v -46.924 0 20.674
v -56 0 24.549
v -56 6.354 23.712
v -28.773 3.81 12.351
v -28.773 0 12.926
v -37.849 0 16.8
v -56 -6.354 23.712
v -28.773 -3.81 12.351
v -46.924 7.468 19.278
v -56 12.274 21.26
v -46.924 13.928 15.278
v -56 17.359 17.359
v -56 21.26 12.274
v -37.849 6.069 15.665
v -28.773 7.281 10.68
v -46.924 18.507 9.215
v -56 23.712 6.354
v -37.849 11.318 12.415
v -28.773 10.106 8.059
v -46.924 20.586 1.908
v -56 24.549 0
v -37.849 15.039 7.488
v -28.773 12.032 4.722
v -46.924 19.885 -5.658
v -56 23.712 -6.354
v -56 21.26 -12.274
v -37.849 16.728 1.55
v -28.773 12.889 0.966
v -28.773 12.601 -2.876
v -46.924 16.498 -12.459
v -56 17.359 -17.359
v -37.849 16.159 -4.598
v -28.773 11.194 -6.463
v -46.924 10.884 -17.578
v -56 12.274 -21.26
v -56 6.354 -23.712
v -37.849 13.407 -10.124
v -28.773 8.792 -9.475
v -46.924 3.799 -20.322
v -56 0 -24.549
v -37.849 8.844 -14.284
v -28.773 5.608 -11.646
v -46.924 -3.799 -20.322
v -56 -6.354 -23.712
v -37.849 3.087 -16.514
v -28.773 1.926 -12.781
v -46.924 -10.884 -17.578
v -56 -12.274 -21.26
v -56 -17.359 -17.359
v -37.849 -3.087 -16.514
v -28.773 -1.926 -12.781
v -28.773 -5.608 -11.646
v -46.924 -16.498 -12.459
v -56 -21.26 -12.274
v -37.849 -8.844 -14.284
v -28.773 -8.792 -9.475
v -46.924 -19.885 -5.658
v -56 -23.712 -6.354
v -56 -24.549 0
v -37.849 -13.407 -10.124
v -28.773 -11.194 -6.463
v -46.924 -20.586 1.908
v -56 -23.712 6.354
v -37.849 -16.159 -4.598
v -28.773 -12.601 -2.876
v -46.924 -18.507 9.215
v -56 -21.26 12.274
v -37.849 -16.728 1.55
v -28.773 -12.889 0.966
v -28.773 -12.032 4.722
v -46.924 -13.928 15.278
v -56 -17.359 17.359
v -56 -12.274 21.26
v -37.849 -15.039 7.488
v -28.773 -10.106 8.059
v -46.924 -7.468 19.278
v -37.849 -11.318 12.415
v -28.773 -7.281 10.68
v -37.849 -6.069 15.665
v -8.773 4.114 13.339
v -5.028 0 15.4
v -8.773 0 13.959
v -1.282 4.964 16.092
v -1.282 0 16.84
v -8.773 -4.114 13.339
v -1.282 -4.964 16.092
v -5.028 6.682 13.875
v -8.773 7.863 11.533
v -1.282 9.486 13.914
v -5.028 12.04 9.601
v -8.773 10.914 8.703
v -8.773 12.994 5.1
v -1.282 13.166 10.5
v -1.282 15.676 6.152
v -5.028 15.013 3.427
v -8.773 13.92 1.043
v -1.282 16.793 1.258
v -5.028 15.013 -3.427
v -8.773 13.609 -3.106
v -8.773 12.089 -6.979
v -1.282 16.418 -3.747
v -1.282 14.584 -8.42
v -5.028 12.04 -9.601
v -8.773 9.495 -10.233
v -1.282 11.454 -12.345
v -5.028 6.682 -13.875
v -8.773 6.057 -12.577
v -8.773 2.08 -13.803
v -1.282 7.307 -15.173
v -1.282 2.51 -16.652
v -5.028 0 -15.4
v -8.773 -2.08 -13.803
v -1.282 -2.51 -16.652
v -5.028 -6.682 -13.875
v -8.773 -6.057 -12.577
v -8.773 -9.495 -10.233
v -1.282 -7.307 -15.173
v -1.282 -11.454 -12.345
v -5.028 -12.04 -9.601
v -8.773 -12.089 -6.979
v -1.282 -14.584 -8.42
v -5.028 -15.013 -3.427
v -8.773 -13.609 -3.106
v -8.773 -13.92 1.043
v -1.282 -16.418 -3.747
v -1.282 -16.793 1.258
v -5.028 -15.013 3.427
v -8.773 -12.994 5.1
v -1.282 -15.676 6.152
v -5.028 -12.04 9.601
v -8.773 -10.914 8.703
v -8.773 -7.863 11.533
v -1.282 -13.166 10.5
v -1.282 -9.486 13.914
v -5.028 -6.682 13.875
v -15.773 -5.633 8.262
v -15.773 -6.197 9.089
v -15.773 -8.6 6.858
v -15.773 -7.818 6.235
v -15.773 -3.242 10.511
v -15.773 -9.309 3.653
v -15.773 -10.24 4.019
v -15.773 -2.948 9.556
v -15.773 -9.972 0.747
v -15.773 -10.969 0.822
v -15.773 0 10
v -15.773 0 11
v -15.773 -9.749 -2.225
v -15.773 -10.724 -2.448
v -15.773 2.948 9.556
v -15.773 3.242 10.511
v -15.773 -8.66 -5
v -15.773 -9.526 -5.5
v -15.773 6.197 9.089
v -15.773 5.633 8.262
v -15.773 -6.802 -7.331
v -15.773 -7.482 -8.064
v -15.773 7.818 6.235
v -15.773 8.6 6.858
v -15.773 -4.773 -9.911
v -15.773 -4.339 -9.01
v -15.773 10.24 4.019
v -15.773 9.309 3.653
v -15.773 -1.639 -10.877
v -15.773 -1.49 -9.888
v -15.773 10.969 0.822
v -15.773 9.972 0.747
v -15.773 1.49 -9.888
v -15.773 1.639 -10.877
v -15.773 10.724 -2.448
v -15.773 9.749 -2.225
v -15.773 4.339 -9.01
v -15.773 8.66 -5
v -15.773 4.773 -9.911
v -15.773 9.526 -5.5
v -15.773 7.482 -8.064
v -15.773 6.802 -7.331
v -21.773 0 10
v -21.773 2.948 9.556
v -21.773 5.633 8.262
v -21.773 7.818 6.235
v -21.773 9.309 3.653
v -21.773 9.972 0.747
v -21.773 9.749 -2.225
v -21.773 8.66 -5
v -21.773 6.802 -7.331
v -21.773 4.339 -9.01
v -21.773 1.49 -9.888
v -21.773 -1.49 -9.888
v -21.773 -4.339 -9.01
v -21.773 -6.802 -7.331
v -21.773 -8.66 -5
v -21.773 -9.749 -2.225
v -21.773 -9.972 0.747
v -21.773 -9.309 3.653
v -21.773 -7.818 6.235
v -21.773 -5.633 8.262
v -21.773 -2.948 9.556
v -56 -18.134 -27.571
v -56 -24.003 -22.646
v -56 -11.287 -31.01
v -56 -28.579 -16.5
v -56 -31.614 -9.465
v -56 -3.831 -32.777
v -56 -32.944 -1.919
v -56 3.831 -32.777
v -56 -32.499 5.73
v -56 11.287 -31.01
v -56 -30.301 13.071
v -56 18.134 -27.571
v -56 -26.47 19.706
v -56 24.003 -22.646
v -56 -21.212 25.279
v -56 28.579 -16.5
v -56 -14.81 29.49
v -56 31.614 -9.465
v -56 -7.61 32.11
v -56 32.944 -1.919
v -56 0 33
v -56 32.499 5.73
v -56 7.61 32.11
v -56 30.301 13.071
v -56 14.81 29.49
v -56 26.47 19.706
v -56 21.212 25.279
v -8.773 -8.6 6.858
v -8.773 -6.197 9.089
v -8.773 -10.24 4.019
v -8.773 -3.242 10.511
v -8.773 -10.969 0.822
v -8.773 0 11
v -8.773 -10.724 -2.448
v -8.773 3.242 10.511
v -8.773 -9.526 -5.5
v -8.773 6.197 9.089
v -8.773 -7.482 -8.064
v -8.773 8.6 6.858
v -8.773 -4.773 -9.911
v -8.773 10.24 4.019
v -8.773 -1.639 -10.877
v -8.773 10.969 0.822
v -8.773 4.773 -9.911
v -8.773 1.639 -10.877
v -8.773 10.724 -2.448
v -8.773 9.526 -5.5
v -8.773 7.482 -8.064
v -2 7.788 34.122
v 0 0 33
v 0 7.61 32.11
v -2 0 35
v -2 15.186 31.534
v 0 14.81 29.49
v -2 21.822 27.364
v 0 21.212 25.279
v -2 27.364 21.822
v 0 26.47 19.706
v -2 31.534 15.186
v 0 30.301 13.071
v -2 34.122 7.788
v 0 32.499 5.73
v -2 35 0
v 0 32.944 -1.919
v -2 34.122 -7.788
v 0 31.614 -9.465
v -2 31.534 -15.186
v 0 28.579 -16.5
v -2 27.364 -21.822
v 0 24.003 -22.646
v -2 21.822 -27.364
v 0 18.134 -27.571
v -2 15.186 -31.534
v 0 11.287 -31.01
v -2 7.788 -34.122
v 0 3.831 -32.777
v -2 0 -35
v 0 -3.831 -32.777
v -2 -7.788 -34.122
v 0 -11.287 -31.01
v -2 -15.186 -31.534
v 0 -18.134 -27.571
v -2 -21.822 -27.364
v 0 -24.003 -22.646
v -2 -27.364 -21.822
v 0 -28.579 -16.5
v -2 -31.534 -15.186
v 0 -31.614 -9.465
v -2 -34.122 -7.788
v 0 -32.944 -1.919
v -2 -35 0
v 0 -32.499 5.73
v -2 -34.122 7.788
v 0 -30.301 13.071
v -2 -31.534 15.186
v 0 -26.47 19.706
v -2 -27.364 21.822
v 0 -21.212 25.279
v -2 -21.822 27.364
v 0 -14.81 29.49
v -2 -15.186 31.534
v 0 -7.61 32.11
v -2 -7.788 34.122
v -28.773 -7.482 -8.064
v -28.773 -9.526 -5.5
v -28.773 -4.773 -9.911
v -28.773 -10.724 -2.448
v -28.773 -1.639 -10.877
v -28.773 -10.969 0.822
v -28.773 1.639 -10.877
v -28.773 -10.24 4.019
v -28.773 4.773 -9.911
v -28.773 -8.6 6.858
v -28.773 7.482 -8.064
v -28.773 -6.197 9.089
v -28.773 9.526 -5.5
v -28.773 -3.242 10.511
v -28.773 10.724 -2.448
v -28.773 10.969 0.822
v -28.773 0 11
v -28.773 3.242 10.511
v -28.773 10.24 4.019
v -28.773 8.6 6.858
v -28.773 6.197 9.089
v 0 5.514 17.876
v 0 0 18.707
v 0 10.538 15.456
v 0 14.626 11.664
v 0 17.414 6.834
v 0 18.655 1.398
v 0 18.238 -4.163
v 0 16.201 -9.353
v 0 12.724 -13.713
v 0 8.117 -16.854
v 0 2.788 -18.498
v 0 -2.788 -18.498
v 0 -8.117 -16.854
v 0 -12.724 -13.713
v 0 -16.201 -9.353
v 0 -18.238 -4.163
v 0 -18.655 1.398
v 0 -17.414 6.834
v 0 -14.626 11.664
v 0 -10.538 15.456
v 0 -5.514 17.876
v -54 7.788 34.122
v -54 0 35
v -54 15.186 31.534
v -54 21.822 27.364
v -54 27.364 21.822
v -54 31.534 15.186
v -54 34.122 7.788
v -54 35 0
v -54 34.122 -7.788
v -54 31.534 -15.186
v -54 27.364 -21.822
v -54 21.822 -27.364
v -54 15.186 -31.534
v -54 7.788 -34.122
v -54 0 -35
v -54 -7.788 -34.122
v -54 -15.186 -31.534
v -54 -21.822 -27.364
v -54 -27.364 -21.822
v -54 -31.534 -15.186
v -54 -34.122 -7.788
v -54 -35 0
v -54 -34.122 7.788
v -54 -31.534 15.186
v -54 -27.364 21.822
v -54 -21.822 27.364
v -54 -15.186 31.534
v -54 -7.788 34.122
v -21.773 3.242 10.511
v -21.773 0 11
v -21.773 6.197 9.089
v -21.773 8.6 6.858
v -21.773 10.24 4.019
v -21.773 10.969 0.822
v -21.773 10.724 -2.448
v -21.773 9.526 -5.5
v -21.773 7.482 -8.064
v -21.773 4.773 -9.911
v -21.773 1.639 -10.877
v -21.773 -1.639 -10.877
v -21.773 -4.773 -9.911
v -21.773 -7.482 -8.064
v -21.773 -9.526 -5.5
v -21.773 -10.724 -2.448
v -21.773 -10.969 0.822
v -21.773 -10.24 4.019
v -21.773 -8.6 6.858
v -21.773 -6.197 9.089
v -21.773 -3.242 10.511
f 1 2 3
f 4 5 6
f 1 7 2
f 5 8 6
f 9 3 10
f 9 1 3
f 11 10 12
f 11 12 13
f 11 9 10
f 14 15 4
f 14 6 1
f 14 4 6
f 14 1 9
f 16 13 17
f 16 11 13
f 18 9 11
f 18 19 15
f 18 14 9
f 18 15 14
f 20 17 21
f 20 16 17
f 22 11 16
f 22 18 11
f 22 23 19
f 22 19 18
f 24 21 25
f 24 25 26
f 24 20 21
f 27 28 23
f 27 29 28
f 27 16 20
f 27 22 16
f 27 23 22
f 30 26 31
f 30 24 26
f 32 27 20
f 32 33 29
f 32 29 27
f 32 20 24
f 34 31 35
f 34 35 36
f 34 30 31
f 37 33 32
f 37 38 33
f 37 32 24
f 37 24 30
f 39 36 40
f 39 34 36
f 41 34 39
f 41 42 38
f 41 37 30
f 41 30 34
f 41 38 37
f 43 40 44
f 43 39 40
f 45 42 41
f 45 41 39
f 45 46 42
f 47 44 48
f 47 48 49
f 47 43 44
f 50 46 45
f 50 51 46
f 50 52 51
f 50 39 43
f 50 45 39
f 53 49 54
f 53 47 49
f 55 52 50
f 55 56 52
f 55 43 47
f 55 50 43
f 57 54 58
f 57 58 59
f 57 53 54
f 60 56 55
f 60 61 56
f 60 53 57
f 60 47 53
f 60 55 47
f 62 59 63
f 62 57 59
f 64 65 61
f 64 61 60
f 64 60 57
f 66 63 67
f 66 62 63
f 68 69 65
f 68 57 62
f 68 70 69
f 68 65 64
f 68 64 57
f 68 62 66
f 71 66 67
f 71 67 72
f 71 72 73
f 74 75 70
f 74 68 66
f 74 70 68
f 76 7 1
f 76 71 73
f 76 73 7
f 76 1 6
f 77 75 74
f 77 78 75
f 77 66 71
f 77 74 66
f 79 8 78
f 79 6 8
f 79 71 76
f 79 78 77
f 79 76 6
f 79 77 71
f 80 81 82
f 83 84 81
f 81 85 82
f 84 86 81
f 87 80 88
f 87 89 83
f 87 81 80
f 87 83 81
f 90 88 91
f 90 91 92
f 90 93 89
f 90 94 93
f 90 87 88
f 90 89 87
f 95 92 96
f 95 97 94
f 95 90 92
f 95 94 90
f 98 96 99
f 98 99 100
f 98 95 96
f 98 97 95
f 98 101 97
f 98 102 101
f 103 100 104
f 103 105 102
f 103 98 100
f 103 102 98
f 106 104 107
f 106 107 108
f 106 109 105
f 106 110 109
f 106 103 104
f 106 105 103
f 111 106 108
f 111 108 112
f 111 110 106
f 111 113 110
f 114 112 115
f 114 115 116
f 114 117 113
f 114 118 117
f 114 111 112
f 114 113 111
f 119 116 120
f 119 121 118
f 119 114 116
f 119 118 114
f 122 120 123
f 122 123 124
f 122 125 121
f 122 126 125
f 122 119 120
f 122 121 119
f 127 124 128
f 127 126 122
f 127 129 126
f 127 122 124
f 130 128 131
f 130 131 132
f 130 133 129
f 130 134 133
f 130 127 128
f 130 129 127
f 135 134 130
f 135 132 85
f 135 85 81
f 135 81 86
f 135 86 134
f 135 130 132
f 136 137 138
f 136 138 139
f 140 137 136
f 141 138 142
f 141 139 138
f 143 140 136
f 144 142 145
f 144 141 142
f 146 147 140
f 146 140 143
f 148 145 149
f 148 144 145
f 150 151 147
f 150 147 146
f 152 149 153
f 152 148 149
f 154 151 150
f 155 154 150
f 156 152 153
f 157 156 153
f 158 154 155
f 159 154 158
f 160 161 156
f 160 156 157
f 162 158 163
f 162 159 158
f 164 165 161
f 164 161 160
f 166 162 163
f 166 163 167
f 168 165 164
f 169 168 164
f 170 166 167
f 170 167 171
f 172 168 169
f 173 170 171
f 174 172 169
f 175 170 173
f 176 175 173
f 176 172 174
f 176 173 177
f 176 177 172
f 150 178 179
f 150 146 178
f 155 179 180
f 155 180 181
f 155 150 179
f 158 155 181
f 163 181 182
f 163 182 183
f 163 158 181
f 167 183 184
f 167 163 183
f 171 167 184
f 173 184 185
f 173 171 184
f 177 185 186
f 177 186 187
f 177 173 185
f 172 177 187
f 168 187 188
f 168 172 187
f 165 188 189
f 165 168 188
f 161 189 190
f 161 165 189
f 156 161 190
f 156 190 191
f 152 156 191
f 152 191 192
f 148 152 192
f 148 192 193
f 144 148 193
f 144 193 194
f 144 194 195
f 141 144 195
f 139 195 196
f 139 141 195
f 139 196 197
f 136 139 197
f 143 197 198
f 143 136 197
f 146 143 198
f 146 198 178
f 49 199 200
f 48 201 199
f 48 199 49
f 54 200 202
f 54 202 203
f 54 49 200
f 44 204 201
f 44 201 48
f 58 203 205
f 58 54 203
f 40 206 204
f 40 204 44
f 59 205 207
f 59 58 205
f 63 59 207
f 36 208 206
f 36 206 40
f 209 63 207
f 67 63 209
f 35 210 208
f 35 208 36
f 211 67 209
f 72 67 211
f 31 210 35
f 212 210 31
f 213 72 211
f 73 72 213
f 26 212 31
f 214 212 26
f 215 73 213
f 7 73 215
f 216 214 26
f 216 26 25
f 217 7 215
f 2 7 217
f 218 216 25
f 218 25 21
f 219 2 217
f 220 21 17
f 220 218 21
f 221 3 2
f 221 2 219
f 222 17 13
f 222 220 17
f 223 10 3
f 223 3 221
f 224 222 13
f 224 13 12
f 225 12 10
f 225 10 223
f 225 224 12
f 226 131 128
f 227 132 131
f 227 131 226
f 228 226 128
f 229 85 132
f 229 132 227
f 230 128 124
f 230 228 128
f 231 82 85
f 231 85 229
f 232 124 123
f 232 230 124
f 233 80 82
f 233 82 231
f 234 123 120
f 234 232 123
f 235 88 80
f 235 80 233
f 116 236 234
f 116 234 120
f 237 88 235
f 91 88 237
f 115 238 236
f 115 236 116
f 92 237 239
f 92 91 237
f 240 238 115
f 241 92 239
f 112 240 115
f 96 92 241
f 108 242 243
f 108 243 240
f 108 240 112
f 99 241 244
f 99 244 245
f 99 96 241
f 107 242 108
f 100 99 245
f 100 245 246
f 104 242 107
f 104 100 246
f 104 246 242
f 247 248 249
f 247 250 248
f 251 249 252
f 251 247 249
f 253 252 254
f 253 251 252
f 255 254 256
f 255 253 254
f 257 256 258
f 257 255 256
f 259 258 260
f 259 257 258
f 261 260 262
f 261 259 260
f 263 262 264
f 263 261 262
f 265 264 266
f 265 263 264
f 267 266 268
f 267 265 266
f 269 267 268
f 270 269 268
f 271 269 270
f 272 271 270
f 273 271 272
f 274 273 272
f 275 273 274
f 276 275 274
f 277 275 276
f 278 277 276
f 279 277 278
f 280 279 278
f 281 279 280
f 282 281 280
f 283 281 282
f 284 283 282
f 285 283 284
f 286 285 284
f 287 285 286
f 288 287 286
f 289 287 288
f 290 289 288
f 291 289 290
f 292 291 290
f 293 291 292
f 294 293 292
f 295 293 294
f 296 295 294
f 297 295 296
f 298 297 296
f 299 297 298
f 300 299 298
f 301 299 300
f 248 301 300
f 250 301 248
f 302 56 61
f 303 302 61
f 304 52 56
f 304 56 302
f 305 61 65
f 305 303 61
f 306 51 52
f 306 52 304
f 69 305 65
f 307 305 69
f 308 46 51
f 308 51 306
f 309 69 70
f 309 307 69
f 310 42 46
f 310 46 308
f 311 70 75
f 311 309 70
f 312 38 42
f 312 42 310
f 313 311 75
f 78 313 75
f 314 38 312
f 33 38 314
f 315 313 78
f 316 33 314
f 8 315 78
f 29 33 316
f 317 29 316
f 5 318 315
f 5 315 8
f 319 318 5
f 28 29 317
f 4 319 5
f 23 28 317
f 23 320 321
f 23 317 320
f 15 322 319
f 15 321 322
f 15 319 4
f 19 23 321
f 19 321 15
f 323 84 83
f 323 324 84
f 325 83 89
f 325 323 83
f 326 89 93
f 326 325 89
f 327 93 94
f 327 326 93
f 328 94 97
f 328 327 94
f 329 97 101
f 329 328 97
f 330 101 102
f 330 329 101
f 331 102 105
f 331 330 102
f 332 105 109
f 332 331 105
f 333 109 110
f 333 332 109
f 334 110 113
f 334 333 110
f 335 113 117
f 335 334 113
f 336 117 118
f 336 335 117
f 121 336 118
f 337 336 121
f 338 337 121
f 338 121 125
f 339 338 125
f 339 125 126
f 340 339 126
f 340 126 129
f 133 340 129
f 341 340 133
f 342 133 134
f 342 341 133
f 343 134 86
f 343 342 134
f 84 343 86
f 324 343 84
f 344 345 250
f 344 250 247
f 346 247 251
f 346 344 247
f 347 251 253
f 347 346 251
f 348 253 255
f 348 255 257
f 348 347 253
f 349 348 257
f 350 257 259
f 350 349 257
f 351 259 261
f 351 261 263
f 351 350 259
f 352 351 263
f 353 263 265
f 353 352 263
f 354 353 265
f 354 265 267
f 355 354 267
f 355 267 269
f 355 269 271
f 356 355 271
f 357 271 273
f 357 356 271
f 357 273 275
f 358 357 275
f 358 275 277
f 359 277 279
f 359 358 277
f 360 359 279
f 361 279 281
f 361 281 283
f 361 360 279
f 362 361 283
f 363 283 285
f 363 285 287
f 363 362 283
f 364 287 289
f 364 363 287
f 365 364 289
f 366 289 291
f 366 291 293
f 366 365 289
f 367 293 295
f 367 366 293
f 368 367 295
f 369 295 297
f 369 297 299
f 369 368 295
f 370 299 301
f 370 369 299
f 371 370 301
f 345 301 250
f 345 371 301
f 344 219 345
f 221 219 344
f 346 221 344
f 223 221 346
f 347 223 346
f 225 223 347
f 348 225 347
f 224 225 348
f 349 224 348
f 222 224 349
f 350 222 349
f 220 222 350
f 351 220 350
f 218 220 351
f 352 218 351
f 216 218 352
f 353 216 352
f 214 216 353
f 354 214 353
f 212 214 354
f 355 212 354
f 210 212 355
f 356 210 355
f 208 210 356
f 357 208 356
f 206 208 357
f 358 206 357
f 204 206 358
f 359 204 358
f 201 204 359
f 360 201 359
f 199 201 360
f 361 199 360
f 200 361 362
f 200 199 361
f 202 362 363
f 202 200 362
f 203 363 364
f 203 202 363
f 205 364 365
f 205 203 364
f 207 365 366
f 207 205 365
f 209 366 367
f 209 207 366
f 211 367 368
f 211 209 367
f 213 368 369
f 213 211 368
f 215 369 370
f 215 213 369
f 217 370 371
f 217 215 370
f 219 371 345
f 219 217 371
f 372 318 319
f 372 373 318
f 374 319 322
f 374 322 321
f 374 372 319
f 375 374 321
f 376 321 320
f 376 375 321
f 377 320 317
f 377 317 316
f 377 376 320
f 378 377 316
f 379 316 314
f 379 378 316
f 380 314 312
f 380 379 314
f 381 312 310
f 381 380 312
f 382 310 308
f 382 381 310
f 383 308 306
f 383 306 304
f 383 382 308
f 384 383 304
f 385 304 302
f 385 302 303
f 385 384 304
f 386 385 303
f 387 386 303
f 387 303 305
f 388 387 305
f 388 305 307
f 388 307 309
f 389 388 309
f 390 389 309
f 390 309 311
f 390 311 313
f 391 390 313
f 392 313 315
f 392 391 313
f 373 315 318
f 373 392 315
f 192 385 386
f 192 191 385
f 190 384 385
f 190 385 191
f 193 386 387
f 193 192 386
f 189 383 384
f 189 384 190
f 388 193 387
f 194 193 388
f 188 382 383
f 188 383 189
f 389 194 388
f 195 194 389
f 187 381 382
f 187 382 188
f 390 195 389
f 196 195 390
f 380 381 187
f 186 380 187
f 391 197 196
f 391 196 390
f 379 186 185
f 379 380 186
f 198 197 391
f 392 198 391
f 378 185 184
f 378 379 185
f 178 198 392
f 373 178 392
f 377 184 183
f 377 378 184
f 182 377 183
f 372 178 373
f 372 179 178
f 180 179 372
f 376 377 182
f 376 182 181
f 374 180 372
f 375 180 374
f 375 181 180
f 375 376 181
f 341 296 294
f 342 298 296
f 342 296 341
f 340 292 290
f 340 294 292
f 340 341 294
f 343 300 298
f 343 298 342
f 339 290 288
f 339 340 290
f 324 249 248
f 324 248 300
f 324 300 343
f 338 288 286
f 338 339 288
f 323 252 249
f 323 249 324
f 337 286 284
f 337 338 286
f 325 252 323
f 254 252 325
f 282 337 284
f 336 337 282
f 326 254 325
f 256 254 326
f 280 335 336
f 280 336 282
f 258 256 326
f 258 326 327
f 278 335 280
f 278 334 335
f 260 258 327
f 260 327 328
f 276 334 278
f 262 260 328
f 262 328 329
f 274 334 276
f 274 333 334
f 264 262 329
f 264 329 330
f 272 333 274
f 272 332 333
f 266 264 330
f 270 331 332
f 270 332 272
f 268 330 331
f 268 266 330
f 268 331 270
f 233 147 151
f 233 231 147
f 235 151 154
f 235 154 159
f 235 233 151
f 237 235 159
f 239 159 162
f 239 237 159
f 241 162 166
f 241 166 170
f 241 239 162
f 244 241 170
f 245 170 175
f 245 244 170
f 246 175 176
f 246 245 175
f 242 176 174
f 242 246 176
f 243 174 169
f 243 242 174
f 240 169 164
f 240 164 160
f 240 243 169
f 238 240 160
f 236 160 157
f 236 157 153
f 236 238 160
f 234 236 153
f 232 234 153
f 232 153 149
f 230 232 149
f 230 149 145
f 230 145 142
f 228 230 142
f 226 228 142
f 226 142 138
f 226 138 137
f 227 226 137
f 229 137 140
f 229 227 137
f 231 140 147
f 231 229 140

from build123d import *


# Not quite as in the source:
# - a fillet or chamfer that OpenCascade refuses, or shapes differently, is made with other operations: its cross-section is extruded or revolved along the edge and cut away or added


with BuildPart() as f1:
    # F0 (on Front) → F1 (revolve)
    with BuildSketch(Plane.XZ):
        Polygon((-15.7733729929, 11), (-8.7733729929, 11), (-8.7733729929, 13.9589581495), (0, 17.3333312895), (0, 35), (-56, 35), (-56, 24.5486367494), (-28.7733729929, 12.9255643114), (-28.7733729929, 11), (-21.7733729929, 11), (-21.7733729929, 10), (-15.7733729929, 10), align=None)
    revolve(axis=Axis((-19.2243028432, 0, 0), (-1, 0, 0)))

    # F2: chamfer of 2 on 3 edges, made by hand

    # F2_s1 → F2_t2 (revolve, cut)
    with BuildSketch(Plane.XZ):
        Polygon((0, 33), (-2, 35), (0, 35), align=None)
    revolve(axis=Axis((0, 0, 0), (-1, 0, 0)), mode=Mode.SUBTRACT)

    # F2_s3 → F2_t4 (revolve, cut)
    with BuildSketch(Plane.XZ):
        Polygon((-54, 35), (-56, 33), (-56, 35), align=None)
    revolve(axis=Axis((-56, 0, 0), (-1, 0, 0)), mode=Mode.SUBTRACT)

    # F2_s5 → F2_t6 (revolve, cut)
    with BuildSketch(Plane.XZ):
        Polygon((-1.2820420431, 16.840238355), (0, 18.706929645), (0, 17.3333312895), align=None)
    revolve(axis=Axis((0, 0, 0), (-1, 0, 0)), mode=Mode.SUBTRACT)


solid = f1.part
